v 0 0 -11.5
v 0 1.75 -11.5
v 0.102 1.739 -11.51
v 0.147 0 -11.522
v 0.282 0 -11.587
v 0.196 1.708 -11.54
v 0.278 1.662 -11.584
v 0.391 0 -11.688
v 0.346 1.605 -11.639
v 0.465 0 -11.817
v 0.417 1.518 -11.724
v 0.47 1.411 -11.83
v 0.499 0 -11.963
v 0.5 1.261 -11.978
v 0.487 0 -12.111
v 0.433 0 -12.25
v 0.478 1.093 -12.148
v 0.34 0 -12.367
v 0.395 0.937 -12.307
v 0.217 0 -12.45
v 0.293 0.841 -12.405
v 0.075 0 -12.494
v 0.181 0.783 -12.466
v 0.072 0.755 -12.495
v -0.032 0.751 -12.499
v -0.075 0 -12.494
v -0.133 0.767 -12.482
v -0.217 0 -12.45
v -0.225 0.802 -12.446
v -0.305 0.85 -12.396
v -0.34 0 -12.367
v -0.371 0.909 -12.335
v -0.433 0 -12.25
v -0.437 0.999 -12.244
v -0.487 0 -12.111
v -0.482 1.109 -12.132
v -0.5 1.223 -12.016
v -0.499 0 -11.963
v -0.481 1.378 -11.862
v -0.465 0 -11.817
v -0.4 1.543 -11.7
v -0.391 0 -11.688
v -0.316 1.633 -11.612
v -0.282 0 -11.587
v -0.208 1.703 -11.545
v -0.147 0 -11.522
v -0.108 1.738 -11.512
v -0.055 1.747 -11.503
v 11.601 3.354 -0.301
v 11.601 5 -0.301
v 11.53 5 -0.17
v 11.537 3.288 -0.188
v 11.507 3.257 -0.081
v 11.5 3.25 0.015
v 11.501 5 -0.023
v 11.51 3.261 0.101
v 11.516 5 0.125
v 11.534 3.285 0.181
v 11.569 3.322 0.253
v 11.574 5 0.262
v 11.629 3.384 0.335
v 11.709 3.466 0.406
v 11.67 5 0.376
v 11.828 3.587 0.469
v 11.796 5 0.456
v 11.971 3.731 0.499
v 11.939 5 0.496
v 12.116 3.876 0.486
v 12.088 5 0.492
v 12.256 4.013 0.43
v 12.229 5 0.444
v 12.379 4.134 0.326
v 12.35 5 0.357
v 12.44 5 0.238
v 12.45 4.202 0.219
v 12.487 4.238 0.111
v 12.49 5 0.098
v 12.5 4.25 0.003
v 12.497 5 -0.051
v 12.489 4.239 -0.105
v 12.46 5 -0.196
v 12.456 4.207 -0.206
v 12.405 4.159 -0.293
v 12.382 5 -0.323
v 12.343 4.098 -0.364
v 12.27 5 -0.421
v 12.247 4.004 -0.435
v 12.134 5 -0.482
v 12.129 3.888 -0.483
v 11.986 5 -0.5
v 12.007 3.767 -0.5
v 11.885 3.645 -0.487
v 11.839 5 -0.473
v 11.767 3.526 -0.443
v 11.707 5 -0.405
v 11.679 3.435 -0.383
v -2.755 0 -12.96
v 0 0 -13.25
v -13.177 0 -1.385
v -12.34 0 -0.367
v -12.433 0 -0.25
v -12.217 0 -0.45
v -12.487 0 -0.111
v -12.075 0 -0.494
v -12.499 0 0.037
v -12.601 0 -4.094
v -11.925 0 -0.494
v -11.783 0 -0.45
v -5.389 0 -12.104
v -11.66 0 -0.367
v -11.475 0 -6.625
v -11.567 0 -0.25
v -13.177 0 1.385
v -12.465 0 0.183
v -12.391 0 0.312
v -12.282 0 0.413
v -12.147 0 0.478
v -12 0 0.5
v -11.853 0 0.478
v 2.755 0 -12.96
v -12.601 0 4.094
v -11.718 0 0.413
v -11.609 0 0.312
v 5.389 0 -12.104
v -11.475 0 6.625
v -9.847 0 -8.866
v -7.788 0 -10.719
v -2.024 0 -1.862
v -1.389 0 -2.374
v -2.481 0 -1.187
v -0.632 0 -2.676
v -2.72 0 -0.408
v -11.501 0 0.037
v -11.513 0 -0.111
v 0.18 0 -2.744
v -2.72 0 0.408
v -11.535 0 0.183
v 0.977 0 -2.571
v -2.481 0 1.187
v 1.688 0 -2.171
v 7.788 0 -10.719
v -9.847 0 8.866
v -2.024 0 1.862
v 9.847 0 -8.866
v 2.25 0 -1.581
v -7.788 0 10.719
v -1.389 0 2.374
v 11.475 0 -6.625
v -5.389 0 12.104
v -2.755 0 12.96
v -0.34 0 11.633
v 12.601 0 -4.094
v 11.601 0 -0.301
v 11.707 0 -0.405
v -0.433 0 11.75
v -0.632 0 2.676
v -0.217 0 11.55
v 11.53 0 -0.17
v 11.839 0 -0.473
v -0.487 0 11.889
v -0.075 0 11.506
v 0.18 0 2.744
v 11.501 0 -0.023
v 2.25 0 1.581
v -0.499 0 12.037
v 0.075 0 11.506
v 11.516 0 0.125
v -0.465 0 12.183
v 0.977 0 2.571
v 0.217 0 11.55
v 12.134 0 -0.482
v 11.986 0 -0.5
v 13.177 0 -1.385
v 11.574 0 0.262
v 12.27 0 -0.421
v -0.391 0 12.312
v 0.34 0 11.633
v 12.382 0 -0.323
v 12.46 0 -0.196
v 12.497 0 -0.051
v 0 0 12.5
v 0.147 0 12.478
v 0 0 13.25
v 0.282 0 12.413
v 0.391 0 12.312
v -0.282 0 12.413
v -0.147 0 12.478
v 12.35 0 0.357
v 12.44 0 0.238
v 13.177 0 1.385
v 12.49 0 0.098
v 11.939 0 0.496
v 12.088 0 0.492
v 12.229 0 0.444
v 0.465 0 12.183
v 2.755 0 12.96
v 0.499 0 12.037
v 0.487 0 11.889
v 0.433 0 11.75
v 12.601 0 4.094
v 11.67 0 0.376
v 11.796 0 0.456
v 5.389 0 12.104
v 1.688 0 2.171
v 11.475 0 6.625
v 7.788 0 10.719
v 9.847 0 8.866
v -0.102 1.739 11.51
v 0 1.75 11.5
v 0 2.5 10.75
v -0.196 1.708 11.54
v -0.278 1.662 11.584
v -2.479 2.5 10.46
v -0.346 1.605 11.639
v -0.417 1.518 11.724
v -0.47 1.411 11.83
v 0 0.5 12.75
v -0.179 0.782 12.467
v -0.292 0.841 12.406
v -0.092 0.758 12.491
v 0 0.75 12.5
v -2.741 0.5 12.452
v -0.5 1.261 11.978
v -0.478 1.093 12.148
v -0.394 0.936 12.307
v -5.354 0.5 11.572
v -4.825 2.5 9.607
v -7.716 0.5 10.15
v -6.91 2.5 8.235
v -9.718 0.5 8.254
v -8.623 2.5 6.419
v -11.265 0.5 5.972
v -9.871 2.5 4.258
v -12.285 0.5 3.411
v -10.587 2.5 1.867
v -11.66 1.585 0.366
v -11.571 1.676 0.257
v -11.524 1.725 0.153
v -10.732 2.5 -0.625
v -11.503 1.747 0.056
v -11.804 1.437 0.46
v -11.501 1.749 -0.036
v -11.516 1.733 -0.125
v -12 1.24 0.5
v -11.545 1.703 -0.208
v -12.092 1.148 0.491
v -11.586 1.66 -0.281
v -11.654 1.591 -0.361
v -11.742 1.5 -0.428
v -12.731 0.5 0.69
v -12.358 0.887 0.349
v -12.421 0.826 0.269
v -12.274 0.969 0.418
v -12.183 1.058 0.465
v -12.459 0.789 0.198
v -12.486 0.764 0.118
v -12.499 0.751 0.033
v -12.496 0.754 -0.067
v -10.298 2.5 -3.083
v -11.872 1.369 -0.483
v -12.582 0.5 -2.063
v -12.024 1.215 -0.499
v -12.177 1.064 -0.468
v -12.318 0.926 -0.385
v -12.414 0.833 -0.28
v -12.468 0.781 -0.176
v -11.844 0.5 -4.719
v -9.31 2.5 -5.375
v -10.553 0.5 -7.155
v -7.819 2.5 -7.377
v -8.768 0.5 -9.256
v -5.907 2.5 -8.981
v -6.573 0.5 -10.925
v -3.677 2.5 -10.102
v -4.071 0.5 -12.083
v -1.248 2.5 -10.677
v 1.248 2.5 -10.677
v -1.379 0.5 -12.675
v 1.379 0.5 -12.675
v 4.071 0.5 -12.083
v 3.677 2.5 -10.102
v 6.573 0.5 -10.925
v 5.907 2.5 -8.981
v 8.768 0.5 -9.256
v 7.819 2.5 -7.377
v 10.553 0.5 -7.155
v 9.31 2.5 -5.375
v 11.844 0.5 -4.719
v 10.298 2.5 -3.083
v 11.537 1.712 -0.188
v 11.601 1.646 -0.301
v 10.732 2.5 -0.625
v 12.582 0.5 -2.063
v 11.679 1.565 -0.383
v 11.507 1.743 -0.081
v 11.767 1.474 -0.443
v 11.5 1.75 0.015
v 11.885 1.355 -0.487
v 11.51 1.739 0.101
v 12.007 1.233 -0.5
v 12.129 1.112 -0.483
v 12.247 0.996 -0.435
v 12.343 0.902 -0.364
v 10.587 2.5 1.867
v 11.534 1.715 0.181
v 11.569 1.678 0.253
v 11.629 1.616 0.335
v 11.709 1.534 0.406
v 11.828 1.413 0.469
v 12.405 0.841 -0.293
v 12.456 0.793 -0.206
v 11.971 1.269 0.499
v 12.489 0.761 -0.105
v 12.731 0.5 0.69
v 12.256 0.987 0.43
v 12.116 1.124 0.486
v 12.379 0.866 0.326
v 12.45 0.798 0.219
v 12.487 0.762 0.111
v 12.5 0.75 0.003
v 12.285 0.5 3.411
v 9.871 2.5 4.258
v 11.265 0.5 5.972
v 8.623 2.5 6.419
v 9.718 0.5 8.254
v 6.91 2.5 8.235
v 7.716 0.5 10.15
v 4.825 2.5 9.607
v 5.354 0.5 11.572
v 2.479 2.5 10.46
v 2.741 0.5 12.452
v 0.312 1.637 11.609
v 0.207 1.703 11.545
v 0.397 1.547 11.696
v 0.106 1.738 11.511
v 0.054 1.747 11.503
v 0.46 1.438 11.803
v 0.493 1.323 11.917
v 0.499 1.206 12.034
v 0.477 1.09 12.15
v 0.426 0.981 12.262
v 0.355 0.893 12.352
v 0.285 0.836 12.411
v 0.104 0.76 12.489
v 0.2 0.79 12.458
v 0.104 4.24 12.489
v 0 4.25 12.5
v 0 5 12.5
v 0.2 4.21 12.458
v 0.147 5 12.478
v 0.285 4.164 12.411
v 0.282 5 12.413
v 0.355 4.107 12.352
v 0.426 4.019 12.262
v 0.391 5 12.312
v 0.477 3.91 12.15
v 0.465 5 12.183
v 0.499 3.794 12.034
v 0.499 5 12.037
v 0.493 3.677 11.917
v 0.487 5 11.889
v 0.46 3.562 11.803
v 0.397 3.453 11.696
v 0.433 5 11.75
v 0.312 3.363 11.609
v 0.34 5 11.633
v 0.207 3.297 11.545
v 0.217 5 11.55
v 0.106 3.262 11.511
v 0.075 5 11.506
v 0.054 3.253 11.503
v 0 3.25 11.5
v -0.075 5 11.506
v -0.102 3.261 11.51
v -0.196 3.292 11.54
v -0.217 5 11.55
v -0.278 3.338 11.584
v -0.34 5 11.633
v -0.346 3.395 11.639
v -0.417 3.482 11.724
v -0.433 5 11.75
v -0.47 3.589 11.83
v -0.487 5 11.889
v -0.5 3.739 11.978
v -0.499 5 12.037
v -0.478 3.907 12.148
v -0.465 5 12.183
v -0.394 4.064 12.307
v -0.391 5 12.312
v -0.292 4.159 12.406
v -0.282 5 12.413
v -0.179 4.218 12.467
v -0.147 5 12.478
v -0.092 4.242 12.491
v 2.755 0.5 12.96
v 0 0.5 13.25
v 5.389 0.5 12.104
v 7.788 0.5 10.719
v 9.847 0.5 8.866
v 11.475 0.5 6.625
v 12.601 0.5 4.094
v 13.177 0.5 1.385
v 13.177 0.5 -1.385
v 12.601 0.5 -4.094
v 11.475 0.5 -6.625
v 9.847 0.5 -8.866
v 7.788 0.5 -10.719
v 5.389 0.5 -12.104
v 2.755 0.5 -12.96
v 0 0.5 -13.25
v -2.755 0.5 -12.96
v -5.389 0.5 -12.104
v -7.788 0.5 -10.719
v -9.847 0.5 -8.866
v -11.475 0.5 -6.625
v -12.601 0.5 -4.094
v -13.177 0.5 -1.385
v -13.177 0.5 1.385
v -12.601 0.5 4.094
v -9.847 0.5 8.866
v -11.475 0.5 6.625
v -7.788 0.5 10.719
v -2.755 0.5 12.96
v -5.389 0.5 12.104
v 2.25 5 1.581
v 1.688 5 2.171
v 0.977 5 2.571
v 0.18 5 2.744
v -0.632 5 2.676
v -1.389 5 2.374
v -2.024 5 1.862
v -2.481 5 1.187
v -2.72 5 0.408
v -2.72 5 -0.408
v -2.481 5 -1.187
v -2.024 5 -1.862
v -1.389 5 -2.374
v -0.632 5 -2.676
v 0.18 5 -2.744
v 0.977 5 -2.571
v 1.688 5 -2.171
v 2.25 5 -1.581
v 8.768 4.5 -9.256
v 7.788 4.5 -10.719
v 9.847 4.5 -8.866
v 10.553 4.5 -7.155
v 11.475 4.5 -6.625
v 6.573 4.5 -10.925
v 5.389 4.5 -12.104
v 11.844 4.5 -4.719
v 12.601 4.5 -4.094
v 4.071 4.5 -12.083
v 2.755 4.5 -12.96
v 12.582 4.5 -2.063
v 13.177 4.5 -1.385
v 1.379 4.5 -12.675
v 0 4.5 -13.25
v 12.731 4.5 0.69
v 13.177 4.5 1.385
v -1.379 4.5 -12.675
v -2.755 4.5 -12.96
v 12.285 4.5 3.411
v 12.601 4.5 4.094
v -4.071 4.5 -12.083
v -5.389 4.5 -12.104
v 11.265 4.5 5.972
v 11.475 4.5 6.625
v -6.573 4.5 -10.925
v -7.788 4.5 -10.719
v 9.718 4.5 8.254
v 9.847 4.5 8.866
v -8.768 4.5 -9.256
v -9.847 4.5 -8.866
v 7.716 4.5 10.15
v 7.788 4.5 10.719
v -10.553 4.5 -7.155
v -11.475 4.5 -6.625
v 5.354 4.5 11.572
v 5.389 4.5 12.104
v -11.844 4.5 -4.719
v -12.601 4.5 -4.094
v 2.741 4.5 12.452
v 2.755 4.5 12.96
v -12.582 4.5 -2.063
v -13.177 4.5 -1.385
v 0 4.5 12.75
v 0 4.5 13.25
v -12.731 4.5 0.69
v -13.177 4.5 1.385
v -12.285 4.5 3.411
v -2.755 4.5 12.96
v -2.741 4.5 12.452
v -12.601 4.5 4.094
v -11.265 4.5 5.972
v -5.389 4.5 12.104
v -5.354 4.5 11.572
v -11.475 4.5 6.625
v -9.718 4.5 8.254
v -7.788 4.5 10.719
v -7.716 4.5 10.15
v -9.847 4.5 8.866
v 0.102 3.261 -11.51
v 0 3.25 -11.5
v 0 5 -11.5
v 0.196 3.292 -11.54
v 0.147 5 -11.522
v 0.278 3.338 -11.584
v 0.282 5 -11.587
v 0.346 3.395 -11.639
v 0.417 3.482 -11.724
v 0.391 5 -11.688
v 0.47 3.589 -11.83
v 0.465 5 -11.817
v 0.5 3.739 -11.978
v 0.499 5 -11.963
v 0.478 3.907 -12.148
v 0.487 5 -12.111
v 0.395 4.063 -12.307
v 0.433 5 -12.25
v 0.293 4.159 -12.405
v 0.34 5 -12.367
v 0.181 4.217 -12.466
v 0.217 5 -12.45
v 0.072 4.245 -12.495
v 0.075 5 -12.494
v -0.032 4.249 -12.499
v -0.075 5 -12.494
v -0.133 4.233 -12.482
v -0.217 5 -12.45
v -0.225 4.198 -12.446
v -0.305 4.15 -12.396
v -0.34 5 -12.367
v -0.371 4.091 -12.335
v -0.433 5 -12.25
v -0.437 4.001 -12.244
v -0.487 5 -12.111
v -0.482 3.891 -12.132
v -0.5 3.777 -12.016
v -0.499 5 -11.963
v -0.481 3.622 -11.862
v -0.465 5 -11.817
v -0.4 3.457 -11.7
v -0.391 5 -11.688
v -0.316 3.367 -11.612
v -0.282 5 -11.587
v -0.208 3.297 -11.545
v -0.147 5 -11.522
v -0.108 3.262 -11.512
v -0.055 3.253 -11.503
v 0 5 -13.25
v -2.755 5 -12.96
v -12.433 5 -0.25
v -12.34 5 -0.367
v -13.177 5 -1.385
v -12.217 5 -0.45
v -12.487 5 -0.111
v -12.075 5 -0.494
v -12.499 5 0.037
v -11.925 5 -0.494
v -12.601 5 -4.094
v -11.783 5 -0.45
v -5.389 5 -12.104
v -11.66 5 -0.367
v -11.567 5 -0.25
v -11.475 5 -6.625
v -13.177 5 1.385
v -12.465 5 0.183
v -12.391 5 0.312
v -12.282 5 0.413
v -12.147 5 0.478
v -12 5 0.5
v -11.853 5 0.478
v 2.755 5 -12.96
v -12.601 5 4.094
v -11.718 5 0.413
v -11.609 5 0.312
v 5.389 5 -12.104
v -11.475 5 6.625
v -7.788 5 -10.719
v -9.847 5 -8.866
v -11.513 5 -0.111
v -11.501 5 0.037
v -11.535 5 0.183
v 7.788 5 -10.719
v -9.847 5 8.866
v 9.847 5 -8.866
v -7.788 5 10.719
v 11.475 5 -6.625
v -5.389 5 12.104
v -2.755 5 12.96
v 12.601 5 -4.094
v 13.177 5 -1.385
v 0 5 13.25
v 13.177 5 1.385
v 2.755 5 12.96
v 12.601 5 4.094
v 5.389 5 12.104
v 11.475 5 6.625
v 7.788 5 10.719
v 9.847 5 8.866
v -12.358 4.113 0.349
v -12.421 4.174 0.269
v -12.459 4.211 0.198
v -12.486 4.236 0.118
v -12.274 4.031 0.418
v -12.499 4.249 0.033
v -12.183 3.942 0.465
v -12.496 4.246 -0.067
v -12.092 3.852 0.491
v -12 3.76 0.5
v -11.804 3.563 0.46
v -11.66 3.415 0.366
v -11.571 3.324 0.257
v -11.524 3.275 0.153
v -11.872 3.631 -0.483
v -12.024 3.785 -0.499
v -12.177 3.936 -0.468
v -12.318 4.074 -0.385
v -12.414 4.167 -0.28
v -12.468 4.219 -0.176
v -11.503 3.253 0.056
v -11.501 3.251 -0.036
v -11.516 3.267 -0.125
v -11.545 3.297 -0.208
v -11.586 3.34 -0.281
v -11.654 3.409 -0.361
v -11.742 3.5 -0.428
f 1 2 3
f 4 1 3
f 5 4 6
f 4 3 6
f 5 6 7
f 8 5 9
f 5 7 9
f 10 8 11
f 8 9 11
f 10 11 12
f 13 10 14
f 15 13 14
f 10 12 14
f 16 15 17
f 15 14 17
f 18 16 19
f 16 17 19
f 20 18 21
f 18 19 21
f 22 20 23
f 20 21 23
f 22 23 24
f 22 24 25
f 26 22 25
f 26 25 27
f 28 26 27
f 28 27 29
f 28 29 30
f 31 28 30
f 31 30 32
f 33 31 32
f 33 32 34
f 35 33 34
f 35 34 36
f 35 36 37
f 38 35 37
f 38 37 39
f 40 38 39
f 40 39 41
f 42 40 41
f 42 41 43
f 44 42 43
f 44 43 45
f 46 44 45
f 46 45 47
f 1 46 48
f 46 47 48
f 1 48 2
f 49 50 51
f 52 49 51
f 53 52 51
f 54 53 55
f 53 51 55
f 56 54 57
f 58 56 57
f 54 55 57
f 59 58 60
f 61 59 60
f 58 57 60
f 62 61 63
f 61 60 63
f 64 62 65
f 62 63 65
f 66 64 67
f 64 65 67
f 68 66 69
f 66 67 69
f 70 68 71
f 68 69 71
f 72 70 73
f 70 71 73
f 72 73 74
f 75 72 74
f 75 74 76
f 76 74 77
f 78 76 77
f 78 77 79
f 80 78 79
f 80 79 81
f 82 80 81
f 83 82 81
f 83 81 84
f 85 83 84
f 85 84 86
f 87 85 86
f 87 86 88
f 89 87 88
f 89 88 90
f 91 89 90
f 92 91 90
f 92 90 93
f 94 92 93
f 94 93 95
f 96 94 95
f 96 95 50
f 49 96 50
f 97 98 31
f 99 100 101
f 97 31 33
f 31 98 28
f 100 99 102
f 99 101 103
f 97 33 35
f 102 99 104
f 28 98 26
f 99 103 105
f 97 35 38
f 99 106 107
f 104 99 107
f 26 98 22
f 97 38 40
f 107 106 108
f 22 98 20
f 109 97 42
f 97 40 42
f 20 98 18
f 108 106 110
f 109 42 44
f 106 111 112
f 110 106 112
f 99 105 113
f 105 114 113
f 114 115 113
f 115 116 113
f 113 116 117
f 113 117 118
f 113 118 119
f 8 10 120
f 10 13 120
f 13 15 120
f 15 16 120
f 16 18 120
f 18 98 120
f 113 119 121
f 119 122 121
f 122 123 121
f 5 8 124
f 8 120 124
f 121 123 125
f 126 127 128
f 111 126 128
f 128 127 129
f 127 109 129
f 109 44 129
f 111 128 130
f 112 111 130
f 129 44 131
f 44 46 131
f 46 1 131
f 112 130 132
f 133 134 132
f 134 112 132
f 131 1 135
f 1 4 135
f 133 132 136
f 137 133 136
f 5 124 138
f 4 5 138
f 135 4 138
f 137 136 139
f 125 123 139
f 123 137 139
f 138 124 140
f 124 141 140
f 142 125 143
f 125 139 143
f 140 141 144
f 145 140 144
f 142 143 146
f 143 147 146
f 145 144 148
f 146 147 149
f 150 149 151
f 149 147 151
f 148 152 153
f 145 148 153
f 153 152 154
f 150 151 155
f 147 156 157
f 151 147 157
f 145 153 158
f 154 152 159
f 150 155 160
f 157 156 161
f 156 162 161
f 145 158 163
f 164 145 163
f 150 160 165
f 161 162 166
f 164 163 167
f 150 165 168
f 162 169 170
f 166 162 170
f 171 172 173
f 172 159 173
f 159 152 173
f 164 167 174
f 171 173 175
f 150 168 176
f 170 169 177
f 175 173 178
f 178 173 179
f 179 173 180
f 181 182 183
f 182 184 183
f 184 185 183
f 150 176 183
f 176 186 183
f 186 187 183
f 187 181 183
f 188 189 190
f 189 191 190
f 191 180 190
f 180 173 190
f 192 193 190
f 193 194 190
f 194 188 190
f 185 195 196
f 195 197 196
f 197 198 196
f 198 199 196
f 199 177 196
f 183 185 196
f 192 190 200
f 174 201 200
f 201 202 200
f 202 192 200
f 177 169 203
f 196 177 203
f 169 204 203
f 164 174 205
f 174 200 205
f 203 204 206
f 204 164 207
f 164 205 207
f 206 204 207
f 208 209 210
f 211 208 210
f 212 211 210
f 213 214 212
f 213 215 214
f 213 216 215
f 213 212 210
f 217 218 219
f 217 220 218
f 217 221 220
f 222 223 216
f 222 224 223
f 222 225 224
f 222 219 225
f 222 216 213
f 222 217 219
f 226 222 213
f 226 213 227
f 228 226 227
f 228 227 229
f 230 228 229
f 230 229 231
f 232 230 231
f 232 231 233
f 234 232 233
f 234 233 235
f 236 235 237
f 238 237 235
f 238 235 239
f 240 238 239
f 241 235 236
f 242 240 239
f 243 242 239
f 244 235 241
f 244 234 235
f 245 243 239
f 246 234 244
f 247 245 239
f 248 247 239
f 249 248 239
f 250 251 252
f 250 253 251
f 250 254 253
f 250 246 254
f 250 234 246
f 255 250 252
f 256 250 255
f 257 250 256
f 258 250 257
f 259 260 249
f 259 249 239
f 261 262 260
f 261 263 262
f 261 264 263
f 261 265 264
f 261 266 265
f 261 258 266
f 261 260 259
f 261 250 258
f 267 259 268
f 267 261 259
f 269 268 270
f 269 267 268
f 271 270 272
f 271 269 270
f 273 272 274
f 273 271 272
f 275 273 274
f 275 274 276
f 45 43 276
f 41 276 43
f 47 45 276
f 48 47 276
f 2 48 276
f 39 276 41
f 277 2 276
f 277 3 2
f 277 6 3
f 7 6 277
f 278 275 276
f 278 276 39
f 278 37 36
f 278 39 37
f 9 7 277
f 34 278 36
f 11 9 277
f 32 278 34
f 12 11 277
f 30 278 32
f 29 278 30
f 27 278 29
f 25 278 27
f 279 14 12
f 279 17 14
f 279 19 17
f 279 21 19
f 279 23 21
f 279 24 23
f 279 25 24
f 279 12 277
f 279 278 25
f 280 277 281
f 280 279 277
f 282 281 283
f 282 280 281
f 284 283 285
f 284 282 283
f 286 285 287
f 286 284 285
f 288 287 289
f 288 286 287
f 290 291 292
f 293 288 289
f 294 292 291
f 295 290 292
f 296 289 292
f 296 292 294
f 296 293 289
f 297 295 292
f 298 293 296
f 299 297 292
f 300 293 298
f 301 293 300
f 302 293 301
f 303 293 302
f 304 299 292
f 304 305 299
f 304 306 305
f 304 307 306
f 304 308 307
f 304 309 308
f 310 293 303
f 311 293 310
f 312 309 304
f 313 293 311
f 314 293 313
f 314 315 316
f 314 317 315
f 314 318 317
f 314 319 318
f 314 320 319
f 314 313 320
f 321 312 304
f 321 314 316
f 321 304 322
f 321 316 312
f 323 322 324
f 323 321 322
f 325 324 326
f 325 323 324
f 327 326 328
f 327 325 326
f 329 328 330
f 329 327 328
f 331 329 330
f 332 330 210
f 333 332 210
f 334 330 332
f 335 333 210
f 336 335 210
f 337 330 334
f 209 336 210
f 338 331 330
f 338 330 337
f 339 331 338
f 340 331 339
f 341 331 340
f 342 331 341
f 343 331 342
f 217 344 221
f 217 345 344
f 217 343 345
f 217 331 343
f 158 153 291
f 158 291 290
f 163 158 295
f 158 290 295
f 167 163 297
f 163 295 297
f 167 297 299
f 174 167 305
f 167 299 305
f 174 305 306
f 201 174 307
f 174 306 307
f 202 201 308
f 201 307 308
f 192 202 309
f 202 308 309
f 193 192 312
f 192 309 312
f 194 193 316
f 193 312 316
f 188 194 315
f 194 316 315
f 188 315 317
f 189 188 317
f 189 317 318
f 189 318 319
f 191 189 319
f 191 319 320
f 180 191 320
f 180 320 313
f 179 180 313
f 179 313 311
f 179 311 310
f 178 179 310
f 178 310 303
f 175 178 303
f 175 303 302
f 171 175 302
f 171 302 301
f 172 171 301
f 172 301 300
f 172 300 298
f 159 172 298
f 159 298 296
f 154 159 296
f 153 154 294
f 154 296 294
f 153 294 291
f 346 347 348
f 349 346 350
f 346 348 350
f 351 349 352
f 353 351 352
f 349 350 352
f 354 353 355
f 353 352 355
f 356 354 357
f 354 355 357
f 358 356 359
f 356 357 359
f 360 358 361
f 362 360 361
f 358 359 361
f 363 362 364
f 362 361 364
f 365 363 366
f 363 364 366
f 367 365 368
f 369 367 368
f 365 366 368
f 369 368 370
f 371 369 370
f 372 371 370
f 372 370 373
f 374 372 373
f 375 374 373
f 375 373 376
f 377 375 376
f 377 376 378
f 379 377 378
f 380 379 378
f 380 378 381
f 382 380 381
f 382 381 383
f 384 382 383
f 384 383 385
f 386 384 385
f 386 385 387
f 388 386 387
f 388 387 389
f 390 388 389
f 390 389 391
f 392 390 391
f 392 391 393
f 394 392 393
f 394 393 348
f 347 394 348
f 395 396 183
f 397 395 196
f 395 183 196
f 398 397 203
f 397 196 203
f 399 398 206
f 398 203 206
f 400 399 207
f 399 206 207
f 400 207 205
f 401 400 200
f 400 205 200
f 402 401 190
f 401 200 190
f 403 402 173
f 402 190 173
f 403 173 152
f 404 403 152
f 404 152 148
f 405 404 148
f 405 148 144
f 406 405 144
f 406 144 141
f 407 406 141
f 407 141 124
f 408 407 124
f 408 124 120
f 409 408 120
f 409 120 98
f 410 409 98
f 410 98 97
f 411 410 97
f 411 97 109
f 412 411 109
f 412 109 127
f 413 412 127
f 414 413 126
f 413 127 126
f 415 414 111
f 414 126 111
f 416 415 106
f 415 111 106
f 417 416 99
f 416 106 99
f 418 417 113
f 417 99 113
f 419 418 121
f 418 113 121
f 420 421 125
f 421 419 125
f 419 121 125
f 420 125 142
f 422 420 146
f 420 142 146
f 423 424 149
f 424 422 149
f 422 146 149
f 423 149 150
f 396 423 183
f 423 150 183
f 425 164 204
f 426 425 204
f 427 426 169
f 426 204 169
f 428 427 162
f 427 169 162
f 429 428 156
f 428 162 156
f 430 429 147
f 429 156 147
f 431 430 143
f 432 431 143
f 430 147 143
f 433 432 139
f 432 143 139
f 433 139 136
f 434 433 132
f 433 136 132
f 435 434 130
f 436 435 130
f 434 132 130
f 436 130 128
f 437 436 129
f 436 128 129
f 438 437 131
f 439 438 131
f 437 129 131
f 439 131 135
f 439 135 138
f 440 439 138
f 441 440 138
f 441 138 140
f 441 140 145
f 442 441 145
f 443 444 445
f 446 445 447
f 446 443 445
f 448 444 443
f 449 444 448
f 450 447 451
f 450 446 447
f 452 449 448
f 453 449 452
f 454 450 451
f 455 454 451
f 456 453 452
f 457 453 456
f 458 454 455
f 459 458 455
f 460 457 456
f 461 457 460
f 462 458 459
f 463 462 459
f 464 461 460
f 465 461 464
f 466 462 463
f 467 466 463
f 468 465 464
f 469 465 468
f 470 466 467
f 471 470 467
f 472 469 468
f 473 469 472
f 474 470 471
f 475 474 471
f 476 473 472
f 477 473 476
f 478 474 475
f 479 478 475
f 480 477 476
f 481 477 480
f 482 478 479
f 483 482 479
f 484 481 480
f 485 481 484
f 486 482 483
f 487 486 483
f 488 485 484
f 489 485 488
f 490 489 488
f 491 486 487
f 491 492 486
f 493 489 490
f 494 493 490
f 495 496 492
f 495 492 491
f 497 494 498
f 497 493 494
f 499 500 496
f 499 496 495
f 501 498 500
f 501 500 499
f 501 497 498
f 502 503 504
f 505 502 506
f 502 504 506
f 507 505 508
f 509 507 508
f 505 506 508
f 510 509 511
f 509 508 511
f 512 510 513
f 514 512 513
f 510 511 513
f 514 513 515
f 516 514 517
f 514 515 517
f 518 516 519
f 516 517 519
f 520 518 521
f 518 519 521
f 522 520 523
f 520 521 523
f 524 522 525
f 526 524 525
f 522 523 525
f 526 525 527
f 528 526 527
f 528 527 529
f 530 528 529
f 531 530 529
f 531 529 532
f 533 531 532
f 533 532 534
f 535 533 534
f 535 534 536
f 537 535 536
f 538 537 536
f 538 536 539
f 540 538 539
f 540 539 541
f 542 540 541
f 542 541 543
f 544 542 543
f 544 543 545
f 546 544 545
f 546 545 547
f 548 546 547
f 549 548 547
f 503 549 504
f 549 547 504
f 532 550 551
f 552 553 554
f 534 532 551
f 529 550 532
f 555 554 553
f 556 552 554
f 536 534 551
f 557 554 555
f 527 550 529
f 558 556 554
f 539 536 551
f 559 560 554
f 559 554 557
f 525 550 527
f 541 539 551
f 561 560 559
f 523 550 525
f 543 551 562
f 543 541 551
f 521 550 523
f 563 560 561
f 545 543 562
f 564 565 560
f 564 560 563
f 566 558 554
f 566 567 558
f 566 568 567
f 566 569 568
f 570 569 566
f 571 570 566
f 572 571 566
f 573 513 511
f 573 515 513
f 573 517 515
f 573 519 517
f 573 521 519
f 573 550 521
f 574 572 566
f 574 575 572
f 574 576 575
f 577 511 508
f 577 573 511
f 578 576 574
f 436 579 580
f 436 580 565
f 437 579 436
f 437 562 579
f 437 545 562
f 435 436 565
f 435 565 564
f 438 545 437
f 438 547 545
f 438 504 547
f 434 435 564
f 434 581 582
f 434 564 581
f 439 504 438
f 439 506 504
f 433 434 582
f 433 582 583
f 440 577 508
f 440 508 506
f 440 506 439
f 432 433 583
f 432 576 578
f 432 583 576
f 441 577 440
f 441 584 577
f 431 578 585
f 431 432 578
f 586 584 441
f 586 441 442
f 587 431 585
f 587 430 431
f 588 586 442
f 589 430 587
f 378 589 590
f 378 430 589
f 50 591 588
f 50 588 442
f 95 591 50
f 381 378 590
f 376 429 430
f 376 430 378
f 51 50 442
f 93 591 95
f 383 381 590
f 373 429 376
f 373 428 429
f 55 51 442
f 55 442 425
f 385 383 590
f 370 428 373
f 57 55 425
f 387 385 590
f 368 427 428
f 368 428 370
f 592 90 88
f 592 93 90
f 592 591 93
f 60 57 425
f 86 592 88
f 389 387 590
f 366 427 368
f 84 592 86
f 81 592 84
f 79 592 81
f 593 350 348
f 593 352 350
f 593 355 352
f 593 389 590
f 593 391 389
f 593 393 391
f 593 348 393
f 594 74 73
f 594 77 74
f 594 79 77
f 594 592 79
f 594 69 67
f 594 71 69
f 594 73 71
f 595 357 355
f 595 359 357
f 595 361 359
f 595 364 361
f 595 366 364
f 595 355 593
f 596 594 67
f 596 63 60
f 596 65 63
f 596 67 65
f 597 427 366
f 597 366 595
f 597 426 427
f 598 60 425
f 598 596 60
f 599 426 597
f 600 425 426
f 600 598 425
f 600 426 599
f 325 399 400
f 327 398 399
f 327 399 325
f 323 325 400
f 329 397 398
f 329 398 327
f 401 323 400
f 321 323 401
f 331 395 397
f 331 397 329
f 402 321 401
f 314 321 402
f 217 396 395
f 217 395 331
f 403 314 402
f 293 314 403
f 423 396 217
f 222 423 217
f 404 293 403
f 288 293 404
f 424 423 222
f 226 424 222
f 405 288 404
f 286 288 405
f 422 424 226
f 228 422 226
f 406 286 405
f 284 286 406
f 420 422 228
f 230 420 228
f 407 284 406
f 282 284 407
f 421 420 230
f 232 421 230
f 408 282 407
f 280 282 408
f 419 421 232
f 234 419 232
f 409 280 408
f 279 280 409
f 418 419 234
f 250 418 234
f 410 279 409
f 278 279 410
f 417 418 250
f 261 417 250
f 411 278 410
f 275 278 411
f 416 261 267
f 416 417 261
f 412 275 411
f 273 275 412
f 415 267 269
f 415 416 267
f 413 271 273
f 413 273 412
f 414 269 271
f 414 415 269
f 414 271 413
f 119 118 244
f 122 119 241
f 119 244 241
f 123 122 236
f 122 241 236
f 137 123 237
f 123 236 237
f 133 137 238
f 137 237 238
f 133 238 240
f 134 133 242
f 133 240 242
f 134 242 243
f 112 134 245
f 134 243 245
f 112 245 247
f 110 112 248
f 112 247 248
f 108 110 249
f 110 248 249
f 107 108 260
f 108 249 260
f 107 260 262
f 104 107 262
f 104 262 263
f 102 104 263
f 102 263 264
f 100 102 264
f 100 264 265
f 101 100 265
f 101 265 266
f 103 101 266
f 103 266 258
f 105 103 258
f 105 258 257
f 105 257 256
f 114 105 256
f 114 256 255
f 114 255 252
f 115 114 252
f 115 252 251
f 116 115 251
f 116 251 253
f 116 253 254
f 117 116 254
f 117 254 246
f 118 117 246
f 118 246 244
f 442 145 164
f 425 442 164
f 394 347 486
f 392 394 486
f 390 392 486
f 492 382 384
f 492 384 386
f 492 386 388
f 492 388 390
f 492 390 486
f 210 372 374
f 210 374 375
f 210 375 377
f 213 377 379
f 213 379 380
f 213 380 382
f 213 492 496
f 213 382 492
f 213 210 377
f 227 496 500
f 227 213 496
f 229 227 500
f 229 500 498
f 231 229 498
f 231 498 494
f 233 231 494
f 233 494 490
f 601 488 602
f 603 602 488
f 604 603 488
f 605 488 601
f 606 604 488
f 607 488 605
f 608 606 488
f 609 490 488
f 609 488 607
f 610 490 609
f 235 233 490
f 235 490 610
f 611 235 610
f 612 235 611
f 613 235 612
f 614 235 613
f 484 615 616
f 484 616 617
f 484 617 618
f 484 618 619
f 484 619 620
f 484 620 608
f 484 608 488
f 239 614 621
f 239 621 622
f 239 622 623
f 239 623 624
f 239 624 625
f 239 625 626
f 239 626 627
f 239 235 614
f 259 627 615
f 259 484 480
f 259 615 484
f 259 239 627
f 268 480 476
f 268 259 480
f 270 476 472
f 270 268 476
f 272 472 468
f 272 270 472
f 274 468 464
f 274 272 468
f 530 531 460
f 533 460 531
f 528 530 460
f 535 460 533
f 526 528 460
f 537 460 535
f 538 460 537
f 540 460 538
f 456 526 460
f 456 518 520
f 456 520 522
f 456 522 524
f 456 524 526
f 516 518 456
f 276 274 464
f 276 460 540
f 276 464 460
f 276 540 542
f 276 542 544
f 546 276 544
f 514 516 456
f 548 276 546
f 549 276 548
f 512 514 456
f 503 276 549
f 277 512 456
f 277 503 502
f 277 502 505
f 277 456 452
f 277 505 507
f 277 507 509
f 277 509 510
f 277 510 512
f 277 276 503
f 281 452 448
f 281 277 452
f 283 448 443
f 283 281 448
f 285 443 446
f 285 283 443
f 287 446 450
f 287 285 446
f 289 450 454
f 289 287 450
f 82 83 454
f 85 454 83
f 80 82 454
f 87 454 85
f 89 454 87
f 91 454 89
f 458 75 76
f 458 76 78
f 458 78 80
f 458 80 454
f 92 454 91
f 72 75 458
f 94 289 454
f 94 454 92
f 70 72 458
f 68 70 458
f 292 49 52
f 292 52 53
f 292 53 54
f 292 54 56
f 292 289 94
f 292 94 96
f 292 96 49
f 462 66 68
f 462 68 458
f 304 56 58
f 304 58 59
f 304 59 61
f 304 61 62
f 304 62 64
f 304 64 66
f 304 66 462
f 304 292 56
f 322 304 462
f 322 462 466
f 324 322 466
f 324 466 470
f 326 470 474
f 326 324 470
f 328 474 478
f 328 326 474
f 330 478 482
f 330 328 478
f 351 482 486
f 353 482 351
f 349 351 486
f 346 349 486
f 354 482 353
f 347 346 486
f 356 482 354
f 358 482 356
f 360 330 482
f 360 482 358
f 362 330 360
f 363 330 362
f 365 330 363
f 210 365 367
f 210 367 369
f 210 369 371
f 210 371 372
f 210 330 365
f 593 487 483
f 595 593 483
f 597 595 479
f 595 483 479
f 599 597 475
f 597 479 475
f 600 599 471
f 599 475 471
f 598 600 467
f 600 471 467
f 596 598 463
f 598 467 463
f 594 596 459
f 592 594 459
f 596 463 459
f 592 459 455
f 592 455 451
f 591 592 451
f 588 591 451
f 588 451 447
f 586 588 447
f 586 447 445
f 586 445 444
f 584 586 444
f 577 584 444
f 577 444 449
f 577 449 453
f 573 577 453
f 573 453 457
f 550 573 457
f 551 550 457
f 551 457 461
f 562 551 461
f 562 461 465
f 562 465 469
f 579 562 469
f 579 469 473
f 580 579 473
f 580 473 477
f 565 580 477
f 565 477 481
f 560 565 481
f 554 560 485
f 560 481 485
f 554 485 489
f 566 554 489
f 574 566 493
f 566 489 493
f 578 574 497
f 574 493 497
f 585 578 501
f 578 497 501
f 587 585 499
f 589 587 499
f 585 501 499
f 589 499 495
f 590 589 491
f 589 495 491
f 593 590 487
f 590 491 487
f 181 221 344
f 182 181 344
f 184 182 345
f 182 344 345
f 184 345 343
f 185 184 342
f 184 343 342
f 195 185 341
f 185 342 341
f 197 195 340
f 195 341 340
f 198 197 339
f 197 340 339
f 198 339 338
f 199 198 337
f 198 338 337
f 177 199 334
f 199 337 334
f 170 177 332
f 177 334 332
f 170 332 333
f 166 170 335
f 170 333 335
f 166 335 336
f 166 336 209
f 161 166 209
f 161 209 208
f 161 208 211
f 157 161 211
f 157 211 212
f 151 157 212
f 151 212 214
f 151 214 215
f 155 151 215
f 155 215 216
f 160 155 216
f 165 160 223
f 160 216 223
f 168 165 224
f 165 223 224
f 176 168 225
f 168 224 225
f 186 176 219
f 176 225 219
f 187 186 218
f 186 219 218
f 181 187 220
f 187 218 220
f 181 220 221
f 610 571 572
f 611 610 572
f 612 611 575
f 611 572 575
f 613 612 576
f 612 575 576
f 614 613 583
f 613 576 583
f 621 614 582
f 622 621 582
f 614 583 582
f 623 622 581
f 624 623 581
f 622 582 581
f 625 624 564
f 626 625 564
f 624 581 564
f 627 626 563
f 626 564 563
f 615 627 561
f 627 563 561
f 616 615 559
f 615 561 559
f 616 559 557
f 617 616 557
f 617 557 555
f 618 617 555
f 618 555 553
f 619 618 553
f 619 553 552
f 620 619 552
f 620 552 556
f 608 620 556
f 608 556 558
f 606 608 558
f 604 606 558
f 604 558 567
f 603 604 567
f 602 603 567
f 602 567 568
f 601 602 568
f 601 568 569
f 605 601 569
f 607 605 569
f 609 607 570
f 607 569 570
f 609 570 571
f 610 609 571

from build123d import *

# Parameters (mm, degrees)
SKETCH1_R           = 13.25
BOSS_EXTRUDE1_DEPTH = 5
SKETCH5_R           = 0.5
CUT_EXTRUDE1_DEPTH  = 5


with BuildPart() as part:
    # Sketch1 → Boss-Extrude1 (new body)
    with BuildSketch(Plane(origin=(0, 0, 0), x_dir=(1, 0, 0), z_dir=(0, 1, 0))):
        with Locations(Location((0, 0, 0), (0, 0, 270))):
            Circle(SKETCH1_R)
        with BuildLine():
            Line((2.25, 1.58113883), (2.25, -1.58113883))
            ThreePointArc((2.25, -1.58113883), (-2.75, 0), (2.25, 1.58113883))
        make_face(mode=Mode.SUBTRACT)
    extrude(amount=BOSS_EXTRUDE1_DEPTH)

    # Sketch4 → Cut-Revolve1 (revolve, cut)
    with BuildSketch(Plane.ZY):
        Polygon((12.75, 4.5), (10.75, 2.5), (12.75, 0.5), (13.25, 0.5), (13.25, 4.5), align=None)
    revolve(axis=Axis((0, 5, 0), (0, -1, 0)), mode=Mode.SUBTRACT)

    # Sketch5 → Cut-Extrude1 (cut)
    with BuildSketch(Plane(origin=(0, 5, 0), x_dir=(1, 0, 0), z_dir=(0, 1, 0))):
        with Locations(Location((-12, 0, 0), (0, 0, 270))):
            Circle(SKETCH5_R)
        with Locations(Location((12, 0, 0), (0, 0, 143.030391189))):
            Circle(SKETCH5_R)
        with Locations(Location((0, 12, 0), (0, 0, 270))):
            Circle(SKETCH5_R)
        with Locations(Location((0, -12, 0), (0, 0, 270.000003371))):
            Circle(SKETCH5_R)
    extrude(amount=-CUT_EXTRUDE1_DEPTH, mode=Mode.SUBTRACT)


solid = part.part
